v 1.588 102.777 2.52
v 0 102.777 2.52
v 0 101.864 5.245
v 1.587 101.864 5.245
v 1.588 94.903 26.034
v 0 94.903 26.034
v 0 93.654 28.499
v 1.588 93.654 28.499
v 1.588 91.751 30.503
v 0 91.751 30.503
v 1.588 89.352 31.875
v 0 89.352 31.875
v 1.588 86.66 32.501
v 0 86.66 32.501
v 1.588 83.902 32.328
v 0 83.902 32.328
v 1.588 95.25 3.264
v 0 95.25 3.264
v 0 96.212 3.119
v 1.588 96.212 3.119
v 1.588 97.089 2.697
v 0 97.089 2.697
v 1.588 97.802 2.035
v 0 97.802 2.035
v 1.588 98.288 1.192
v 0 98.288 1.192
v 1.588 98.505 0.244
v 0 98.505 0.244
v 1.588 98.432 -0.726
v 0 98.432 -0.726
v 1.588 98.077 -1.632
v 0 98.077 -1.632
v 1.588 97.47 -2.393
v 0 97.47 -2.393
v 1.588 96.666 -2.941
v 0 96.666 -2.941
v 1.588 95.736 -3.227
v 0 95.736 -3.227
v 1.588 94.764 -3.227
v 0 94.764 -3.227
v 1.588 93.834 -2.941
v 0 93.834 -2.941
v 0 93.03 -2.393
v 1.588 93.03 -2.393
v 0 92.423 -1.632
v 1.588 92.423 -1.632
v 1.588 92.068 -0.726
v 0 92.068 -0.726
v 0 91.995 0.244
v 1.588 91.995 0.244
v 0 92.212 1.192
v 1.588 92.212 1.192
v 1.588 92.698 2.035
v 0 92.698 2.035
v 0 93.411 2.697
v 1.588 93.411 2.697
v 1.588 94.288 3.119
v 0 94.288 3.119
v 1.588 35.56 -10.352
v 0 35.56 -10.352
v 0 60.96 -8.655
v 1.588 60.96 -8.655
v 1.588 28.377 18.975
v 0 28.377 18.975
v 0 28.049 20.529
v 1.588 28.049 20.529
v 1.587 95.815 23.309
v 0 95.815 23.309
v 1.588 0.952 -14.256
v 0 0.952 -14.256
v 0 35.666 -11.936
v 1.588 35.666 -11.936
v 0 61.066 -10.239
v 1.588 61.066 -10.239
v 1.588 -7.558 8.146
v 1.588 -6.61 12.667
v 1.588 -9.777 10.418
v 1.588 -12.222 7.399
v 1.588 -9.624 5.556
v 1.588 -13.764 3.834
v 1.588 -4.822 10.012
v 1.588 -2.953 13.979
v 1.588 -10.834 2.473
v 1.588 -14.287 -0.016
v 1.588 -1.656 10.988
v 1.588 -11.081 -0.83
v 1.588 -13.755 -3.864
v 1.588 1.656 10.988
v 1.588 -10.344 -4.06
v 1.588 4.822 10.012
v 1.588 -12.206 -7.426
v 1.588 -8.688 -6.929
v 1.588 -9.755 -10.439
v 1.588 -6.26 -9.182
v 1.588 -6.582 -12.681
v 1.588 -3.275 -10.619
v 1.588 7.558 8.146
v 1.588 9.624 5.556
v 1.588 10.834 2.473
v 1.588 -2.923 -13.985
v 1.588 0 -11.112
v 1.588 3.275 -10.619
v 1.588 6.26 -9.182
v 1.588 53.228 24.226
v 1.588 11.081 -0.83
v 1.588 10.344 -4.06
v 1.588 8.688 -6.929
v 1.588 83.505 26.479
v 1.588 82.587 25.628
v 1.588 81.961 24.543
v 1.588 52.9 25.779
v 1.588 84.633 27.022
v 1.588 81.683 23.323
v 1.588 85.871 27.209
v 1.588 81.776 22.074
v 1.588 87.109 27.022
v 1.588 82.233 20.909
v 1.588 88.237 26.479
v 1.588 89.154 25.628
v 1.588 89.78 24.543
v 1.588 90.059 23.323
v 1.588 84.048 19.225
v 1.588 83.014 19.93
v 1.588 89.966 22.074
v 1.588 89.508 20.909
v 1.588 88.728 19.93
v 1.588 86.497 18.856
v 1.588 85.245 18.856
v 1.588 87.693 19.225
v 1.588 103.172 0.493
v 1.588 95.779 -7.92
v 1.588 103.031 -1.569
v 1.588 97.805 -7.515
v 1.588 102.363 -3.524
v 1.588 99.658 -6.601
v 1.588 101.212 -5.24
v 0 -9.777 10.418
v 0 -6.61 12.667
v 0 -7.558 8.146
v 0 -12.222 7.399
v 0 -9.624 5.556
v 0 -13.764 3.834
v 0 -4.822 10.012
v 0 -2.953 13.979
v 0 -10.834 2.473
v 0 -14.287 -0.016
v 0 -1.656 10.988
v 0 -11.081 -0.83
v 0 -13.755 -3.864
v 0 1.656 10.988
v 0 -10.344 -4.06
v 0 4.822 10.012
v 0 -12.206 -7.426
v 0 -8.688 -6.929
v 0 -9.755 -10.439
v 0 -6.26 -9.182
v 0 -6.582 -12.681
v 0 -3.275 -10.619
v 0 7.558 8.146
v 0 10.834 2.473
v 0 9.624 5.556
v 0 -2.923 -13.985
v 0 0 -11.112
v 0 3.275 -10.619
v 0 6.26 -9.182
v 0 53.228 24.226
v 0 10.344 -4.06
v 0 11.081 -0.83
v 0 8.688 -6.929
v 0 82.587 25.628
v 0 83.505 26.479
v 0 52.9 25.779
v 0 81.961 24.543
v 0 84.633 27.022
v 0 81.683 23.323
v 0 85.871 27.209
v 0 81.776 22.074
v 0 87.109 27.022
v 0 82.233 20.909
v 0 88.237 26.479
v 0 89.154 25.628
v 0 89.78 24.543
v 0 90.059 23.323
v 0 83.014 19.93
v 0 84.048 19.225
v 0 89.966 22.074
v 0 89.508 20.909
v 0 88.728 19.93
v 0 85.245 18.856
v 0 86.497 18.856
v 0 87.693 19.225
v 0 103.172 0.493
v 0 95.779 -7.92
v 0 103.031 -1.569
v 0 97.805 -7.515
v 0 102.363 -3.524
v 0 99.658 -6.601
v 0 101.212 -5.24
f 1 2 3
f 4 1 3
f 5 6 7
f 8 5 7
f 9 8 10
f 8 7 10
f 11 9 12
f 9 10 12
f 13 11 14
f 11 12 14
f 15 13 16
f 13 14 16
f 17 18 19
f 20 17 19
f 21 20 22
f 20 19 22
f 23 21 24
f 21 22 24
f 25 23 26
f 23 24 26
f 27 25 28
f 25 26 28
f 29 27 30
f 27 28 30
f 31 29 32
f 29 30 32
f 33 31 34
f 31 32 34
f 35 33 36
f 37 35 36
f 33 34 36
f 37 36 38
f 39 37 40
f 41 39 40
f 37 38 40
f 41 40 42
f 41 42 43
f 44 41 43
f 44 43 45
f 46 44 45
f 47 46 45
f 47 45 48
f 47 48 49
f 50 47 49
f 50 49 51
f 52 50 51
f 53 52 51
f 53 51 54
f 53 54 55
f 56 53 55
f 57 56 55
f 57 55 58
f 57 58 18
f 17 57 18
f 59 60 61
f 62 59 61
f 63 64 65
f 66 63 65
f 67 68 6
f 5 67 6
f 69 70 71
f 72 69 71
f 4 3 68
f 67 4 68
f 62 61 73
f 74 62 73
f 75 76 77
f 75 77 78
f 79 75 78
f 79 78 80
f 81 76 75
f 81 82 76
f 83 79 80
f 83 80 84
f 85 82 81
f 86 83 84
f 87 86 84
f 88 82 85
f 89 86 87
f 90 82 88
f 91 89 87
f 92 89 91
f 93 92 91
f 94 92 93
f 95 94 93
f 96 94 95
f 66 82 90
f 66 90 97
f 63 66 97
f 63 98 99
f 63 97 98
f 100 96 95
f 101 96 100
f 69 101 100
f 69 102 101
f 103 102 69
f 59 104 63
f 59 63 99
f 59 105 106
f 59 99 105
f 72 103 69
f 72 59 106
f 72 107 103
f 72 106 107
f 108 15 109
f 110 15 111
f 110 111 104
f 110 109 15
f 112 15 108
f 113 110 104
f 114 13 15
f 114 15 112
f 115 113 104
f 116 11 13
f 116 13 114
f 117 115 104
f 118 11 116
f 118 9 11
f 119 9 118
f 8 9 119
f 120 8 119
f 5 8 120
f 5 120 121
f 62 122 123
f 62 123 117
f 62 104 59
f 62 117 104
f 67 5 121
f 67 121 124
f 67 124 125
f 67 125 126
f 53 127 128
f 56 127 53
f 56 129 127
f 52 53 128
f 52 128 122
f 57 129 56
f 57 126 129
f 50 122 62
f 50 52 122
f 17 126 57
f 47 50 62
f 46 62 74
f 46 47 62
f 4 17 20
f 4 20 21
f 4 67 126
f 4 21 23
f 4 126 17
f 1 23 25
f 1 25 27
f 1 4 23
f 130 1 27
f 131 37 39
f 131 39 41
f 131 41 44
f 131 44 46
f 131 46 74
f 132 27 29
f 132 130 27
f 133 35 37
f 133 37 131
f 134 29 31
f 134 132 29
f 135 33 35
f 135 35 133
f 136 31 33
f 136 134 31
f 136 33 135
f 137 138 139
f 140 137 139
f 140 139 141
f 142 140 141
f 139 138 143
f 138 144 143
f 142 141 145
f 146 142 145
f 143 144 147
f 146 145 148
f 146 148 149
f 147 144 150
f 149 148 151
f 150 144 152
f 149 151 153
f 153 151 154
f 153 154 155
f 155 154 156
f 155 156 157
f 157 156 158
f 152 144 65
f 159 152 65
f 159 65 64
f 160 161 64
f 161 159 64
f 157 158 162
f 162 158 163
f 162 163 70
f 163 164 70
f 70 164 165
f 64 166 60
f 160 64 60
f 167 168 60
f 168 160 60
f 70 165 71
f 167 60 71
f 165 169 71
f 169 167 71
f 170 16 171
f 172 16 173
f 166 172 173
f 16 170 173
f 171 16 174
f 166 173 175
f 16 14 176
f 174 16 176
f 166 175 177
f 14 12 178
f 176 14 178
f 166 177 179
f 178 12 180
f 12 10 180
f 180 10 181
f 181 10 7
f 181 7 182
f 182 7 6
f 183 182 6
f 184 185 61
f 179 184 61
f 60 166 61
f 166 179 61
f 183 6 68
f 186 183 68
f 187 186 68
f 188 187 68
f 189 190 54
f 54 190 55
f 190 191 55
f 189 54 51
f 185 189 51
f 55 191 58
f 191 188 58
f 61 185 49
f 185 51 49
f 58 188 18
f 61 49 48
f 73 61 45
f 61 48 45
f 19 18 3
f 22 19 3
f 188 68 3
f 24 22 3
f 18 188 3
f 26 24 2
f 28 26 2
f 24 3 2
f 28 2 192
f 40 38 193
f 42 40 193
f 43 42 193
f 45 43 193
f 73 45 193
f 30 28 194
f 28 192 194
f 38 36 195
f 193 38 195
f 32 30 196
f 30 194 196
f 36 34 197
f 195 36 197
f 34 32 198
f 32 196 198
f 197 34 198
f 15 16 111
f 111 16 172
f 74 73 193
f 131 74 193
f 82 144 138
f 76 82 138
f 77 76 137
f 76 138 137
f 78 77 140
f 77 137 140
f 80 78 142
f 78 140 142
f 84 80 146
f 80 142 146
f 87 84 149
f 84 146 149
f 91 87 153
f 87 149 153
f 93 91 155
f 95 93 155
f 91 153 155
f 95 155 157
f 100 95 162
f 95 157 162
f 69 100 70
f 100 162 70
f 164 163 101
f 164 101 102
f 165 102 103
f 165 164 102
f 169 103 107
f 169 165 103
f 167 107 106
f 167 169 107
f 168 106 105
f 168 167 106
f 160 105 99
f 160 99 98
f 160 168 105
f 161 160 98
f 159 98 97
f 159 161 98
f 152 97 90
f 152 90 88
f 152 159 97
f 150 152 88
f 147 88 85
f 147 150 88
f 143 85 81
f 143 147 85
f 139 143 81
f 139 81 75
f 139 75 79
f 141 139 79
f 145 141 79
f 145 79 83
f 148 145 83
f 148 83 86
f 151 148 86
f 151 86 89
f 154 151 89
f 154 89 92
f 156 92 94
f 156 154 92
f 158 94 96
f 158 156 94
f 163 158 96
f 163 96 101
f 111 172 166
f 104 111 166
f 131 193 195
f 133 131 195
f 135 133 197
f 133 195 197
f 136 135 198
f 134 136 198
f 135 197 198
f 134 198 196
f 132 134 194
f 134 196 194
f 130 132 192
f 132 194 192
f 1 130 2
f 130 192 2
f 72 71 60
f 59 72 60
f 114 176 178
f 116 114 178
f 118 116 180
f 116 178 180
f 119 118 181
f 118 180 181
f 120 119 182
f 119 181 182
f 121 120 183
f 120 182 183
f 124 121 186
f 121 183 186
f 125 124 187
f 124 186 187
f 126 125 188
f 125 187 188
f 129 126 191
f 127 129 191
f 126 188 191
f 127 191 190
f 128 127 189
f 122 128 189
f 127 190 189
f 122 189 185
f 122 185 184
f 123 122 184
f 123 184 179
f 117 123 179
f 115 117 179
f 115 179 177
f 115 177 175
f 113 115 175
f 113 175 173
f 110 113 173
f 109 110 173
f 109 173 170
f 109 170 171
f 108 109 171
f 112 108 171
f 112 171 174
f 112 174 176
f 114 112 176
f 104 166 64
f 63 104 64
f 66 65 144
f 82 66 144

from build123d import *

# Parameters (mm, degrees)
SKETCH1_R               = 11.1125
BOSS_EXTRUDE1_DEPTH     = 1.5875
F_1_4_CLEARANCE_HOLE1_D = 6.5278
M8_CLEARANCE_HOLE1_D    = 8.4
BOSS_EXTRUDE2_DEPTH     = 1.5875


with BuildPart() as part:
    # Sketch1 → Boss-Extrude1 (new body)
    with BuildSketch(Plane(origin=(0, 0, 0), x_dir=(0, 0, -1), z_dir=(1, 0, 0))):
        with BuildLine():
            ThreePointArc((-26.033578217, 94.902839555), (-31.276267612, 90.601358567), (-32.328311992, 83.901975506))
            Line((-32.328311992, 83.901975506), (-25.778737426, 52.900096757))
            Line((-25.778737426, 52.900096757), (-24.225520946, 53.228235166))
            Line((-24.225520946, 53.228235166), (-18.975306409, 28.37677148))
            Line((-18.975306409, 28.37677148), (-20.528522889, 28.048633072))
            Line((-20.528522889, 28.048633072), (-13.978948323, -2.953245677))
            ThreePointArc((-13.978948323, -2.953245677), (1.957769706, -14.152730974), (14.255714644, 0.9525))
            Line((14.255714644, 0.9525), (11.936332499, 35.665833333))
            Line((11.936332499, 35.665833333), (10.352364205, 35.56))
            Line((10.352364205, 35.56), (8.655255319, 60.96))
            Line((8.655255319, 60.96), (10.239223613, 61.065833333))
            Line((10.239223613, 61.065833333), (7.919841469, 95.779166667))
            ThreePointArc((7.919841469, 95.779166667), (4.41923637, 101.843501055), (-2.520470923, 102.776694665))
            Line((-2.520470923, 102.776694665), (-5.244990973, 101.864332217))
            Line((-5.244990973, 101.864332217), (-4.740896788, 100.358993285))
            Line((-4.740896788, 100.358993285), (-22.804963983, 94.309863069))
            Line((-22.804963983, 94.309863069), (-23.309058168, 95.815202002))
            Line((-23.309058168, 95.815202002), (-26.033578217, 94.902839555))
        make_face()
        Circle(SKETCH1_R, mode=Mode.SUBTRACT)
    extrude(amount=BOSS_EXTRUDE1_DEPTH)

    # 1/4 Clearance Hole1 (through all)
    with Locations(Plane(origin=(1.5875, 0, 0), x_dir=(0, 0, -1), z_dir=(1, 0, 0))):
        with Locations((0, 95.25)):
            Hole(F_1_4_CLEARANCE_HOLE1_D / 2)

    # M8 Clearance Hole1 (through all)
    with Locations(Plane(origin=(1.5875, 0, 0), x_dir=(0, 0, -1), z_dir=(1, 0, 0))):
        with Locations((-23.00901311, 85.870805957)):
            Hole(M8_CLEARANCE_HOLE1_D / 2)

    # Sketch1<3> → Boss-Extrude2 (add)
    with BuildSketch(Plane(origin=(0, 0, 0), x_dir=(0, 0, -1), z_dir=(1, 0, 0))):
        Polygon((-5.244990973, 101.864332217), (-23.309058168, 95.815202002), (-22.804963983, 94.309863069), (-4.740896788, 100.358993285), align=None)
    extrude(amount=BOSS_EXTRUDE2_DEPTH)


solid = part.part
